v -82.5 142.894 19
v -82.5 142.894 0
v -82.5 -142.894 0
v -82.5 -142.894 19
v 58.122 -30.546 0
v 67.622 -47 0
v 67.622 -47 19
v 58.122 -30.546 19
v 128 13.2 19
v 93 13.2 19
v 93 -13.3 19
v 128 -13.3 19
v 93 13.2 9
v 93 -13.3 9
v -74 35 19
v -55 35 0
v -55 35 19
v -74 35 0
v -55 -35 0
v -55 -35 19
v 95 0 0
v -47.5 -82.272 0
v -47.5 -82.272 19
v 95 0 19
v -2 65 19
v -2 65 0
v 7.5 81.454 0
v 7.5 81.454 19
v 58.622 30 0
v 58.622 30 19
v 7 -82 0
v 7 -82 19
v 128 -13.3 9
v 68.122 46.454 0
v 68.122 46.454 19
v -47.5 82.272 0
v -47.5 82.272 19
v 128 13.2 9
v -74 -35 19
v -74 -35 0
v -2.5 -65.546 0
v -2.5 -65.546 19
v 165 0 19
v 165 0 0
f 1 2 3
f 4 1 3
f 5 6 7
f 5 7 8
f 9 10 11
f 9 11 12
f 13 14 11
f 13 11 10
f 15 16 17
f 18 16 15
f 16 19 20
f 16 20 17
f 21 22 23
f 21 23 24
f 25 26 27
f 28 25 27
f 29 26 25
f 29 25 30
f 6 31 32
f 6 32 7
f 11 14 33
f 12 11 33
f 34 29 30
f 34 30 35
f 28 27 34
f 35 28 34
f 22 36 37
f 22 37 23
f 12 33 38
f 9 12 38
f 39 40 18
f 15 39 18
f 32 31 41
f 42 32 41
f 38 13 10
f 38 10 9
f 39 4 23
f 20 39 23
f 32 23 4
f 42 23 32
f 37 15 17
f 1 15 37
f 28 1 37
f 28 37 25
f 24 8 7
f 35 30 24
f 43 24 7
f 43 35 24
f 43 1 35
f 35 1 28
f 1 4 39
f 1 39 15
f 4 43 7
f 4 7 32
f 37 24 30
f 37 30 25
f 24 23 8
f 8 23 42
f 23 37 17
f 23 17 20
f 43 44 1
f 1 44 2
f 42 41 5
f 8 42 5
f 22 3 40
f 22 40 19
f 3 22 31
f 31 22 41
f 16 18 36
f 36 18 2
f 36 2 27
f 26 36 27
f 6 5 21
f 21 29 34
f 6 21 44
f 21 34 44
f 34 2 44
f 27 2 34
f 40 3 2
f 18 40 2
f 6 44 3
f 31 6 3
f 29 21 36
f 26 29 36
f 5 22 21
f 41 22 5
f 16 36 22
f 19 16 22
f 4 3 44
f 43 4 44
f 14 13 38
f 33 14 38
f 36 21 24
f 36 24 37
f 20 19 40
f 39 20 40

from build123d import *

# Parameters (mm, degrees)
BOX002_W               = 70
BOX002_H               = 19
BOX002_DEPTH           = 19
BOX002_PLACEMENT_ANGLE = 30
BOX001_W               = 70
BOX001_H               = 19
BOX001_DEPTH           = 19
BOX001_PLACEMENT_ANGLE = 90
BOX_W                  = 70
BOX_H                  = 19
BOX_DEPTH              = 19
BOX_PLACEMENT_ANGLE    = 30
PRISM001_DEPTH         = 19
PRISM_DEPTH            = 19
BOX003_W               = 35
BOX003_H               = 26.5
BOX003_DEPTH           = 10


with BuildPart() as box002:
    # Box002 → Box002 (new body)
    with BuildSketch(Plane.XY):
        with Locations((35, 9.5)):
            Rectangle(BOX002_W, BOX002_H)
    extrude(amount=BOX002_DEPTH)


with BuildPart() as box002_1:
    # Box002 placement: moved
    add(box002.part.moved(Location((7, -82, 0))).rotate(Axis((7, -82, 0), (0, 0, 1)), BOX002_PLACEMENT_ANGLE))


with BuildPart() as box001:
    # Box001 → Box001 (new body)
    with BuildSketch(Plane.XY):
        with Locations((35, 9.5)):
            Rectangle(BOX001_W, BOX001_H)
    extrude(amount=BOX001_DEPTH)


with BuildPart() as box001_1:
    # Box001 placement: moved
    add(box001.part.moved(Location((-55, -35, 0))).rotate(Axis((-55, -35, 0), (0, 0, 1)), BOX001_PLACEMENT_ANGLE))


with BuildPart() as box:
    # Box → Box (new body)
    with BuildSketch(Plane.XY):
        with Locations((35, 9.5)):
            Rectangle(BOX_W, BOX_H)
    extrude(amount=BOX_DEPTH)


with BuildPart() as box_1:
    # Box placement: moved
    add(box.part.moved(Location((-2, 65, 0))).rotate(Axis((-2, 65, 0), (0, 0, -1)), BOX_PLACEMENT_ANGLE))


with BuildPart() as prism001:
    # Prism001 → Prism001 (new body)
    with BuildSketch(Plane.XY):
        Polygon((95, 0), (-47.5, 82.272413), (-47.5, -82.272413), align=None)
    extrude(amount=PRISM001_DEPTH)


with BuildPart() as cut003:
    # Prism → Prism (new body)
    with BuildSketch(Plane.XY):
        Polygon((165, 0), (-82.5, 142.894192), (-82.5, -142.894192), align=None)
    extrude(amount=PRISM_DEPTH)

    # Cut: cut Prism001
    add(prism001.part, mode=Mode.SUBTRACT)

    # Cut001: cut Box
    add(box_1.part, mode=Mode.SUBTRACT)

    # Cut002: cut Box001
    add(box001_1.part, mode=Mode.SUBTRACT)

    # Cut003: cut Box002
    add(box002_1.part, mode=Mode.SUBTRACT)


with BuildPart() as box003:
    # Box003 → Box003 (new body)
    with BuildSketch(Plane(origin=(93, -13.3, 9), x_dir=(1, 0, 0), z_dir=(0, 0, 1))):
        with Locations((17.5, 13.25)):
            Rectangle(BOX003_W, BOX003_H)
    extrude(amount=BOX003_DEPTH)


solid = Compound([cut003.part, box003.part])
